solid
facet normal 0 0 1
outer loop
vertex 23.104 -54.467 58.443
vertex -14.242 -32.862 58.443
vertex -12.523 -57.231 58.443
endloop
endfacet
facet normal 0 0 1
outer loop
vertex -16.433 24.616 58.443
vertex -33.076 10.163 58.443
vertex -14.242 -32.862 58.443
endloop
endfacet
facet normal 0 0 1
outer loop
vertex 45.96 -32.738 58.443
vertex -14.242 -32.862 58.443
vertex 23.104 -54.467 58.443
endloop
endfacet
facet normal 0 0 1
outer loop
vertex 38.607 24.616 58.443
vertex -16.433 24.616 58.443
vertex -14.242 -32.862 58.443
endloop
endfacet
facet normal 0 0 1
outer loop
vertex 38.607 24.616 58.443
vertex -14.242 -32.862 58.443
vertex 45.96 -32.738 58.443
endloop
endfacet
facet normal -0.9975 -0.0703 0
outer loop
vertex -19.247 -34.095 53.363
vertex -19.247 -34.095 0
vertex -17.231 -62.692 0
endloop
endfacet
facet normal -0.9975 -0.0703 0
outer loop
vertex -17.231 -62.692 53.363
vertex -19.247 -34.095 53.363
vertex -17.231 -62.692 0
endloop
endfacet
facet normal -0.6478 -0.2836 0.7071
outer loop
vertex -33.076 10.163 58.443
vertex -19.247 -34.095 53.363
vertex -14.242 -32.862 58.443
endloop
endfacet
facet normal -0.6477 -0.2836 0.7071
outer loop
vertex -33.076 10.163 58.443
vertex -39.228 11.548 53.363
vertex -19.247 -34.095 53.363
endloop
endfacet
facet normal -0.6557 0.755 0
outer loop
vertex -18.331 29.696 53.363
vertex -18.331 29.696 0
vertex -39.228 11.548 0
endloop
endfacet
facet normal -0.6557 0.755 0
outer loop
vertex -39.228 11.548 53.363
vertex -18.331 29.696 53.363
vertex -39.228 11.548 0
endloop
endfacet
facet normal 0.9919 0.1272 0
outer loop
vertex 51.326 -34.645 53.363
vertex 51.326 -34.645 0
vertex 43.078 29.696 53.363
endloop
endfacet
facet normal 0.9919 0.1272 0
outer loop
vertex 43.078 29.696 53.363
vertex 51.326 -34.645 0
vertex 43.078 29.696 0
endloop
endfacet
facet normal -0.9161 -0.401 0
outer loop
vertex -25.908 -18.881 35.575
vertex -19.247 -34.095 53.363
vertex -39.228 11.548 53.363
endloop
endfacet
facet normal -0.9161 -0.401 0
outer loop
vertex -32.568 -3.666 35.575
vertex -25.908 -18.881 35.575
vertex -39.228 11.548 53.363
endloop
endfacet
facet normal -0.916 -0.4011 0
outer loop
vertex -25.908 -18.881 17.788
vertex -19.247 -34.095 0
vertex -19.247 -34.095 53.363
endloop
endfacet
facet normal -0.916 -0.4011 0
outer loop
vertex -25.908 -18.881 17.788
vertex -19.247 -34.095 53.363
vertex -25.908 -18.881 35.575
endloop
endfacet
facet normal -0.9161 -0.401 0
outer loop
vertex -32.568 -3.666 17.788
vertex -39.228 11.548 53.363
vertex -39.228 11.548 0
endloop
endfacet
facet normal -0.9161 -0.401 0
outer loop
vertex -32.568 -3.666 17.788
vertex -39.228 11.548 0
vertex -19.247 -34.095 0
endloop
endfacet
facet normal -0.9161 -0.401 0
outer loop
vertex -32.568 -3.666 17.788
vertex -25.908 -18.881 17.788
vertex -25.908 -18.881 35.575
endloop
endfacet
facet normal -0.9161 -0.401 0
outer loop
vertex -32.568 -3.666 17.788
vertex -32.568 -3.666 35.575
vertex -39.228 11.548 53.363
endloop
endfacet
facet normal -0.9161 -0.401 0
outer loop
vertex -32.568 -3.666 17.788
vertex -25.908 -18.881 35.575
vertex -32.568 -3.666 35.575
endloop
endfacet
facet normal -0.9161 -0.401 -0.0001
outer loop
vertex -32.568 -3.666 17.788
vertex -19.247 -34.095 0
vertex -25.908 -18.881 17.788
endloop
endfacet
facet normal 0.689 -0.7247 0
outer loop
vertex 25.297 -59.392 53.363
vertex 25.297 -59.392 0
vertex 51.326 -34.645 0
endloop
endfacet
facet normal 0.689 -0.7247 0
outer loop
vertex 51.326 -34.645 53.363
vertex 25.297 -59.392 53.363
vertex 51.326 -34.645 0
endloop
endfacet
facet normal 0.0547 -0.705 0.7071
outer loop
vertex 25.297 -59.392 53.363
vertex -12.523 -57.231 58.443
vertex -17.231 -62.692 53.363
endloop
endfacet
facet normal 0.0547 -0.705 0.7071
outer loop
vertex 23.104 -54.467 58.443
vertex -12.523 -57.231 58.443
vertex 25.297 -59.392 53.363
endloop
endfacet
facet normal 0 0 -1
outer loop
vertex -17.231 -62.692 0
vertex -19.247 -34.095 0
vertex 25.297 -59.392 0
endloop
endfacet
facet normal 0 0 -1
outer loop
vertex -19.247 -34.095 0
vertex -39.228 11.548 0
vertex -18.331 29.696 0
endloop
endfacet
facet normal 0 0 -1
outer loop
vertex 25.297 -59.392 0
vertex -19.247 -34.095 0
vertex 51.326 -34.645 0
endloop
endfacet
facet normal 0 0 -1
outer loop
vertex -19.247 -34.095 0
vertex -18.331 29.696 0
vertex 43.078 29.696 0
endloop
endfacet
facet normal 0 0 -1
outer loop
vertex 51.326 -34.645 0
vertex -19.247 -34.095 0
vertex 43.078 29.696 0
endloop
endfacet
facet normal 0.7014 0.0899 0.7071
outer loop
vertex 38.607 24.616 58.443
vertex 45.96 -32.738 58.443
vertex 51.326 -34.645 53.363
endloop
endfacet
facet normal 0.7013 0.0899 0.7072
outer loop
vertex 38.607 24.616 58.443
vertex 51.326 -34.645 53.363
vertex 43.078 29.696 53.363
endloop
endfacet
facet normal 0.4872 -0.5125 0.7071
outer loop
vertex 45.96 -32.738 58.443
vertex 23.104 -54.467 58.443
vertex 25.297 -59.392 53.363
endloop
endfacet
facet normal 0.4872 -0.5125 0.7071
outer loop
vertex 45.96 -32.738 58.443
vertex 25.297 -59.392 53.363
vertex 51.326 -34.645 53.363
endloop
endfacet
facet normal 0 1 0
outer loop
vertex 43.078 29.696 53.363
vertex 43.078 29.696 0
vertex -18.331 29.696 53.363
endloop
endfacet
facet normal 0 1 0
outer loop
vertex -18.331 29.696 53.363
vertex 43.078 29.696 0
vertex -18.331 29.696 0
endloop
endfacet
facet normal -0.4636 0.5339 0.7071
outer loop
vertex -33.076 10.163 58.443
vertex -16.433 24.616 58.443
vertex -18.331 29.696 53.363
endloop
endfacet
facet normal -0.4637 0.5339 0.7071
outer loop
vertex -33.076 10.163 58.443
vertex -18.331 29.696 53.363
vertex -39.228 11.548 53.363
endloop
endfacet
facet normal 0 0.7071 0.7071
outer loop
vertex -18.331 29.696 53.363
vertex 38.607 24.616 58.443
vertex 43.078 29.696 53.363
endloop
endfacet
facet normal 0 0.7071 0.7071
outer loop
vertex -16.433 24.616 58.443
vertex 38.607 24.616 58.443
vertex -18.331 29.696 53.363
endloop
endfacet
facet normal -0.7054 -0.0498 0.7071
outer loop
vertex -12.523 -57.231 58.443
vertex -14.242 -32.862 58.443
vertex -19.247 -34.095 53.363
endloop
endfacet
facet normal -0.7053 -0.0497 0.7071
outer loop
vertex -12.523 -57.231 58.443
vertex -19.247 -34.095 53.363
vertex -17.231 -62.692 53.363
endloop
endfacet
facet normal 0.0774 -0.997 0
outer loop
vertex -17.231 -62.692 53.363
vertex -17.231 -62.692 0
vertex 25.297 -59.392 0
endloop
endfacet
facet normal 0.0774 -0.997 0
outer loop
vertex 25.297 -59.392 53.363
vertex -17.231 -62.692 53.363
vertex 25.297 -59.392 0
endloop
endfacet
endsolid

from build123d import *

# Parameters (mm, degrees)
F1_DEPTH = 58.443097
F2_SIZE  = 5.08


with BuildPart() as f1:
    # F0 (on Top) → F1 (new body)
    with BuildSketch(Plane.XY):
        with BuildLine():
            Line((-18.330865, 29.696003), (-39.228059, 11.548445))
            add(Edge.make_bspline(
                [(-19.247405, -34.095421), (-25.907624, -18.880798), (-32.567841, -3.666179), (-39.228059, 11.548445)],
                knots=[0, 0, 0, 0, 49.825586, 49.825586, 49.825586, 49.825586], degree=3))
            Line((-19.247405, -34.095421), (-17.23101, -62.691584))
            Line((-17.23101, -62.691584), (25.296614, -59.392035))
            Line((25.296614, -59.392035), (51.326454, -34.645349))
            Line((51.326454, -34.645349), (43.077558, 29.696003))
            Line((43.077558, 29.696003), (-18.330865, 29.696003))
        make_face()
    extrude(amount=F1_DEPTH)

    # F2
    f2_edges = [f1.edges().sort_by_distance(p)[0] for p in [
        (38.311534, -47.018692, 58.443097),
        (47.202006, -2.474673, 58.443097),
        (12.373347, 29.696003, 58.443097),
        (-28.779462, 20.622224, 58.443097),
        (-29.237732, -11.273488, 58.443097),
        (-18.239208, -48.393503, 58.443097),
        (4.032802, -61.04181, 58.443097),
    ]]
    chamfer(f2_edges, length=F2_SIZE)


solid = f1.part
